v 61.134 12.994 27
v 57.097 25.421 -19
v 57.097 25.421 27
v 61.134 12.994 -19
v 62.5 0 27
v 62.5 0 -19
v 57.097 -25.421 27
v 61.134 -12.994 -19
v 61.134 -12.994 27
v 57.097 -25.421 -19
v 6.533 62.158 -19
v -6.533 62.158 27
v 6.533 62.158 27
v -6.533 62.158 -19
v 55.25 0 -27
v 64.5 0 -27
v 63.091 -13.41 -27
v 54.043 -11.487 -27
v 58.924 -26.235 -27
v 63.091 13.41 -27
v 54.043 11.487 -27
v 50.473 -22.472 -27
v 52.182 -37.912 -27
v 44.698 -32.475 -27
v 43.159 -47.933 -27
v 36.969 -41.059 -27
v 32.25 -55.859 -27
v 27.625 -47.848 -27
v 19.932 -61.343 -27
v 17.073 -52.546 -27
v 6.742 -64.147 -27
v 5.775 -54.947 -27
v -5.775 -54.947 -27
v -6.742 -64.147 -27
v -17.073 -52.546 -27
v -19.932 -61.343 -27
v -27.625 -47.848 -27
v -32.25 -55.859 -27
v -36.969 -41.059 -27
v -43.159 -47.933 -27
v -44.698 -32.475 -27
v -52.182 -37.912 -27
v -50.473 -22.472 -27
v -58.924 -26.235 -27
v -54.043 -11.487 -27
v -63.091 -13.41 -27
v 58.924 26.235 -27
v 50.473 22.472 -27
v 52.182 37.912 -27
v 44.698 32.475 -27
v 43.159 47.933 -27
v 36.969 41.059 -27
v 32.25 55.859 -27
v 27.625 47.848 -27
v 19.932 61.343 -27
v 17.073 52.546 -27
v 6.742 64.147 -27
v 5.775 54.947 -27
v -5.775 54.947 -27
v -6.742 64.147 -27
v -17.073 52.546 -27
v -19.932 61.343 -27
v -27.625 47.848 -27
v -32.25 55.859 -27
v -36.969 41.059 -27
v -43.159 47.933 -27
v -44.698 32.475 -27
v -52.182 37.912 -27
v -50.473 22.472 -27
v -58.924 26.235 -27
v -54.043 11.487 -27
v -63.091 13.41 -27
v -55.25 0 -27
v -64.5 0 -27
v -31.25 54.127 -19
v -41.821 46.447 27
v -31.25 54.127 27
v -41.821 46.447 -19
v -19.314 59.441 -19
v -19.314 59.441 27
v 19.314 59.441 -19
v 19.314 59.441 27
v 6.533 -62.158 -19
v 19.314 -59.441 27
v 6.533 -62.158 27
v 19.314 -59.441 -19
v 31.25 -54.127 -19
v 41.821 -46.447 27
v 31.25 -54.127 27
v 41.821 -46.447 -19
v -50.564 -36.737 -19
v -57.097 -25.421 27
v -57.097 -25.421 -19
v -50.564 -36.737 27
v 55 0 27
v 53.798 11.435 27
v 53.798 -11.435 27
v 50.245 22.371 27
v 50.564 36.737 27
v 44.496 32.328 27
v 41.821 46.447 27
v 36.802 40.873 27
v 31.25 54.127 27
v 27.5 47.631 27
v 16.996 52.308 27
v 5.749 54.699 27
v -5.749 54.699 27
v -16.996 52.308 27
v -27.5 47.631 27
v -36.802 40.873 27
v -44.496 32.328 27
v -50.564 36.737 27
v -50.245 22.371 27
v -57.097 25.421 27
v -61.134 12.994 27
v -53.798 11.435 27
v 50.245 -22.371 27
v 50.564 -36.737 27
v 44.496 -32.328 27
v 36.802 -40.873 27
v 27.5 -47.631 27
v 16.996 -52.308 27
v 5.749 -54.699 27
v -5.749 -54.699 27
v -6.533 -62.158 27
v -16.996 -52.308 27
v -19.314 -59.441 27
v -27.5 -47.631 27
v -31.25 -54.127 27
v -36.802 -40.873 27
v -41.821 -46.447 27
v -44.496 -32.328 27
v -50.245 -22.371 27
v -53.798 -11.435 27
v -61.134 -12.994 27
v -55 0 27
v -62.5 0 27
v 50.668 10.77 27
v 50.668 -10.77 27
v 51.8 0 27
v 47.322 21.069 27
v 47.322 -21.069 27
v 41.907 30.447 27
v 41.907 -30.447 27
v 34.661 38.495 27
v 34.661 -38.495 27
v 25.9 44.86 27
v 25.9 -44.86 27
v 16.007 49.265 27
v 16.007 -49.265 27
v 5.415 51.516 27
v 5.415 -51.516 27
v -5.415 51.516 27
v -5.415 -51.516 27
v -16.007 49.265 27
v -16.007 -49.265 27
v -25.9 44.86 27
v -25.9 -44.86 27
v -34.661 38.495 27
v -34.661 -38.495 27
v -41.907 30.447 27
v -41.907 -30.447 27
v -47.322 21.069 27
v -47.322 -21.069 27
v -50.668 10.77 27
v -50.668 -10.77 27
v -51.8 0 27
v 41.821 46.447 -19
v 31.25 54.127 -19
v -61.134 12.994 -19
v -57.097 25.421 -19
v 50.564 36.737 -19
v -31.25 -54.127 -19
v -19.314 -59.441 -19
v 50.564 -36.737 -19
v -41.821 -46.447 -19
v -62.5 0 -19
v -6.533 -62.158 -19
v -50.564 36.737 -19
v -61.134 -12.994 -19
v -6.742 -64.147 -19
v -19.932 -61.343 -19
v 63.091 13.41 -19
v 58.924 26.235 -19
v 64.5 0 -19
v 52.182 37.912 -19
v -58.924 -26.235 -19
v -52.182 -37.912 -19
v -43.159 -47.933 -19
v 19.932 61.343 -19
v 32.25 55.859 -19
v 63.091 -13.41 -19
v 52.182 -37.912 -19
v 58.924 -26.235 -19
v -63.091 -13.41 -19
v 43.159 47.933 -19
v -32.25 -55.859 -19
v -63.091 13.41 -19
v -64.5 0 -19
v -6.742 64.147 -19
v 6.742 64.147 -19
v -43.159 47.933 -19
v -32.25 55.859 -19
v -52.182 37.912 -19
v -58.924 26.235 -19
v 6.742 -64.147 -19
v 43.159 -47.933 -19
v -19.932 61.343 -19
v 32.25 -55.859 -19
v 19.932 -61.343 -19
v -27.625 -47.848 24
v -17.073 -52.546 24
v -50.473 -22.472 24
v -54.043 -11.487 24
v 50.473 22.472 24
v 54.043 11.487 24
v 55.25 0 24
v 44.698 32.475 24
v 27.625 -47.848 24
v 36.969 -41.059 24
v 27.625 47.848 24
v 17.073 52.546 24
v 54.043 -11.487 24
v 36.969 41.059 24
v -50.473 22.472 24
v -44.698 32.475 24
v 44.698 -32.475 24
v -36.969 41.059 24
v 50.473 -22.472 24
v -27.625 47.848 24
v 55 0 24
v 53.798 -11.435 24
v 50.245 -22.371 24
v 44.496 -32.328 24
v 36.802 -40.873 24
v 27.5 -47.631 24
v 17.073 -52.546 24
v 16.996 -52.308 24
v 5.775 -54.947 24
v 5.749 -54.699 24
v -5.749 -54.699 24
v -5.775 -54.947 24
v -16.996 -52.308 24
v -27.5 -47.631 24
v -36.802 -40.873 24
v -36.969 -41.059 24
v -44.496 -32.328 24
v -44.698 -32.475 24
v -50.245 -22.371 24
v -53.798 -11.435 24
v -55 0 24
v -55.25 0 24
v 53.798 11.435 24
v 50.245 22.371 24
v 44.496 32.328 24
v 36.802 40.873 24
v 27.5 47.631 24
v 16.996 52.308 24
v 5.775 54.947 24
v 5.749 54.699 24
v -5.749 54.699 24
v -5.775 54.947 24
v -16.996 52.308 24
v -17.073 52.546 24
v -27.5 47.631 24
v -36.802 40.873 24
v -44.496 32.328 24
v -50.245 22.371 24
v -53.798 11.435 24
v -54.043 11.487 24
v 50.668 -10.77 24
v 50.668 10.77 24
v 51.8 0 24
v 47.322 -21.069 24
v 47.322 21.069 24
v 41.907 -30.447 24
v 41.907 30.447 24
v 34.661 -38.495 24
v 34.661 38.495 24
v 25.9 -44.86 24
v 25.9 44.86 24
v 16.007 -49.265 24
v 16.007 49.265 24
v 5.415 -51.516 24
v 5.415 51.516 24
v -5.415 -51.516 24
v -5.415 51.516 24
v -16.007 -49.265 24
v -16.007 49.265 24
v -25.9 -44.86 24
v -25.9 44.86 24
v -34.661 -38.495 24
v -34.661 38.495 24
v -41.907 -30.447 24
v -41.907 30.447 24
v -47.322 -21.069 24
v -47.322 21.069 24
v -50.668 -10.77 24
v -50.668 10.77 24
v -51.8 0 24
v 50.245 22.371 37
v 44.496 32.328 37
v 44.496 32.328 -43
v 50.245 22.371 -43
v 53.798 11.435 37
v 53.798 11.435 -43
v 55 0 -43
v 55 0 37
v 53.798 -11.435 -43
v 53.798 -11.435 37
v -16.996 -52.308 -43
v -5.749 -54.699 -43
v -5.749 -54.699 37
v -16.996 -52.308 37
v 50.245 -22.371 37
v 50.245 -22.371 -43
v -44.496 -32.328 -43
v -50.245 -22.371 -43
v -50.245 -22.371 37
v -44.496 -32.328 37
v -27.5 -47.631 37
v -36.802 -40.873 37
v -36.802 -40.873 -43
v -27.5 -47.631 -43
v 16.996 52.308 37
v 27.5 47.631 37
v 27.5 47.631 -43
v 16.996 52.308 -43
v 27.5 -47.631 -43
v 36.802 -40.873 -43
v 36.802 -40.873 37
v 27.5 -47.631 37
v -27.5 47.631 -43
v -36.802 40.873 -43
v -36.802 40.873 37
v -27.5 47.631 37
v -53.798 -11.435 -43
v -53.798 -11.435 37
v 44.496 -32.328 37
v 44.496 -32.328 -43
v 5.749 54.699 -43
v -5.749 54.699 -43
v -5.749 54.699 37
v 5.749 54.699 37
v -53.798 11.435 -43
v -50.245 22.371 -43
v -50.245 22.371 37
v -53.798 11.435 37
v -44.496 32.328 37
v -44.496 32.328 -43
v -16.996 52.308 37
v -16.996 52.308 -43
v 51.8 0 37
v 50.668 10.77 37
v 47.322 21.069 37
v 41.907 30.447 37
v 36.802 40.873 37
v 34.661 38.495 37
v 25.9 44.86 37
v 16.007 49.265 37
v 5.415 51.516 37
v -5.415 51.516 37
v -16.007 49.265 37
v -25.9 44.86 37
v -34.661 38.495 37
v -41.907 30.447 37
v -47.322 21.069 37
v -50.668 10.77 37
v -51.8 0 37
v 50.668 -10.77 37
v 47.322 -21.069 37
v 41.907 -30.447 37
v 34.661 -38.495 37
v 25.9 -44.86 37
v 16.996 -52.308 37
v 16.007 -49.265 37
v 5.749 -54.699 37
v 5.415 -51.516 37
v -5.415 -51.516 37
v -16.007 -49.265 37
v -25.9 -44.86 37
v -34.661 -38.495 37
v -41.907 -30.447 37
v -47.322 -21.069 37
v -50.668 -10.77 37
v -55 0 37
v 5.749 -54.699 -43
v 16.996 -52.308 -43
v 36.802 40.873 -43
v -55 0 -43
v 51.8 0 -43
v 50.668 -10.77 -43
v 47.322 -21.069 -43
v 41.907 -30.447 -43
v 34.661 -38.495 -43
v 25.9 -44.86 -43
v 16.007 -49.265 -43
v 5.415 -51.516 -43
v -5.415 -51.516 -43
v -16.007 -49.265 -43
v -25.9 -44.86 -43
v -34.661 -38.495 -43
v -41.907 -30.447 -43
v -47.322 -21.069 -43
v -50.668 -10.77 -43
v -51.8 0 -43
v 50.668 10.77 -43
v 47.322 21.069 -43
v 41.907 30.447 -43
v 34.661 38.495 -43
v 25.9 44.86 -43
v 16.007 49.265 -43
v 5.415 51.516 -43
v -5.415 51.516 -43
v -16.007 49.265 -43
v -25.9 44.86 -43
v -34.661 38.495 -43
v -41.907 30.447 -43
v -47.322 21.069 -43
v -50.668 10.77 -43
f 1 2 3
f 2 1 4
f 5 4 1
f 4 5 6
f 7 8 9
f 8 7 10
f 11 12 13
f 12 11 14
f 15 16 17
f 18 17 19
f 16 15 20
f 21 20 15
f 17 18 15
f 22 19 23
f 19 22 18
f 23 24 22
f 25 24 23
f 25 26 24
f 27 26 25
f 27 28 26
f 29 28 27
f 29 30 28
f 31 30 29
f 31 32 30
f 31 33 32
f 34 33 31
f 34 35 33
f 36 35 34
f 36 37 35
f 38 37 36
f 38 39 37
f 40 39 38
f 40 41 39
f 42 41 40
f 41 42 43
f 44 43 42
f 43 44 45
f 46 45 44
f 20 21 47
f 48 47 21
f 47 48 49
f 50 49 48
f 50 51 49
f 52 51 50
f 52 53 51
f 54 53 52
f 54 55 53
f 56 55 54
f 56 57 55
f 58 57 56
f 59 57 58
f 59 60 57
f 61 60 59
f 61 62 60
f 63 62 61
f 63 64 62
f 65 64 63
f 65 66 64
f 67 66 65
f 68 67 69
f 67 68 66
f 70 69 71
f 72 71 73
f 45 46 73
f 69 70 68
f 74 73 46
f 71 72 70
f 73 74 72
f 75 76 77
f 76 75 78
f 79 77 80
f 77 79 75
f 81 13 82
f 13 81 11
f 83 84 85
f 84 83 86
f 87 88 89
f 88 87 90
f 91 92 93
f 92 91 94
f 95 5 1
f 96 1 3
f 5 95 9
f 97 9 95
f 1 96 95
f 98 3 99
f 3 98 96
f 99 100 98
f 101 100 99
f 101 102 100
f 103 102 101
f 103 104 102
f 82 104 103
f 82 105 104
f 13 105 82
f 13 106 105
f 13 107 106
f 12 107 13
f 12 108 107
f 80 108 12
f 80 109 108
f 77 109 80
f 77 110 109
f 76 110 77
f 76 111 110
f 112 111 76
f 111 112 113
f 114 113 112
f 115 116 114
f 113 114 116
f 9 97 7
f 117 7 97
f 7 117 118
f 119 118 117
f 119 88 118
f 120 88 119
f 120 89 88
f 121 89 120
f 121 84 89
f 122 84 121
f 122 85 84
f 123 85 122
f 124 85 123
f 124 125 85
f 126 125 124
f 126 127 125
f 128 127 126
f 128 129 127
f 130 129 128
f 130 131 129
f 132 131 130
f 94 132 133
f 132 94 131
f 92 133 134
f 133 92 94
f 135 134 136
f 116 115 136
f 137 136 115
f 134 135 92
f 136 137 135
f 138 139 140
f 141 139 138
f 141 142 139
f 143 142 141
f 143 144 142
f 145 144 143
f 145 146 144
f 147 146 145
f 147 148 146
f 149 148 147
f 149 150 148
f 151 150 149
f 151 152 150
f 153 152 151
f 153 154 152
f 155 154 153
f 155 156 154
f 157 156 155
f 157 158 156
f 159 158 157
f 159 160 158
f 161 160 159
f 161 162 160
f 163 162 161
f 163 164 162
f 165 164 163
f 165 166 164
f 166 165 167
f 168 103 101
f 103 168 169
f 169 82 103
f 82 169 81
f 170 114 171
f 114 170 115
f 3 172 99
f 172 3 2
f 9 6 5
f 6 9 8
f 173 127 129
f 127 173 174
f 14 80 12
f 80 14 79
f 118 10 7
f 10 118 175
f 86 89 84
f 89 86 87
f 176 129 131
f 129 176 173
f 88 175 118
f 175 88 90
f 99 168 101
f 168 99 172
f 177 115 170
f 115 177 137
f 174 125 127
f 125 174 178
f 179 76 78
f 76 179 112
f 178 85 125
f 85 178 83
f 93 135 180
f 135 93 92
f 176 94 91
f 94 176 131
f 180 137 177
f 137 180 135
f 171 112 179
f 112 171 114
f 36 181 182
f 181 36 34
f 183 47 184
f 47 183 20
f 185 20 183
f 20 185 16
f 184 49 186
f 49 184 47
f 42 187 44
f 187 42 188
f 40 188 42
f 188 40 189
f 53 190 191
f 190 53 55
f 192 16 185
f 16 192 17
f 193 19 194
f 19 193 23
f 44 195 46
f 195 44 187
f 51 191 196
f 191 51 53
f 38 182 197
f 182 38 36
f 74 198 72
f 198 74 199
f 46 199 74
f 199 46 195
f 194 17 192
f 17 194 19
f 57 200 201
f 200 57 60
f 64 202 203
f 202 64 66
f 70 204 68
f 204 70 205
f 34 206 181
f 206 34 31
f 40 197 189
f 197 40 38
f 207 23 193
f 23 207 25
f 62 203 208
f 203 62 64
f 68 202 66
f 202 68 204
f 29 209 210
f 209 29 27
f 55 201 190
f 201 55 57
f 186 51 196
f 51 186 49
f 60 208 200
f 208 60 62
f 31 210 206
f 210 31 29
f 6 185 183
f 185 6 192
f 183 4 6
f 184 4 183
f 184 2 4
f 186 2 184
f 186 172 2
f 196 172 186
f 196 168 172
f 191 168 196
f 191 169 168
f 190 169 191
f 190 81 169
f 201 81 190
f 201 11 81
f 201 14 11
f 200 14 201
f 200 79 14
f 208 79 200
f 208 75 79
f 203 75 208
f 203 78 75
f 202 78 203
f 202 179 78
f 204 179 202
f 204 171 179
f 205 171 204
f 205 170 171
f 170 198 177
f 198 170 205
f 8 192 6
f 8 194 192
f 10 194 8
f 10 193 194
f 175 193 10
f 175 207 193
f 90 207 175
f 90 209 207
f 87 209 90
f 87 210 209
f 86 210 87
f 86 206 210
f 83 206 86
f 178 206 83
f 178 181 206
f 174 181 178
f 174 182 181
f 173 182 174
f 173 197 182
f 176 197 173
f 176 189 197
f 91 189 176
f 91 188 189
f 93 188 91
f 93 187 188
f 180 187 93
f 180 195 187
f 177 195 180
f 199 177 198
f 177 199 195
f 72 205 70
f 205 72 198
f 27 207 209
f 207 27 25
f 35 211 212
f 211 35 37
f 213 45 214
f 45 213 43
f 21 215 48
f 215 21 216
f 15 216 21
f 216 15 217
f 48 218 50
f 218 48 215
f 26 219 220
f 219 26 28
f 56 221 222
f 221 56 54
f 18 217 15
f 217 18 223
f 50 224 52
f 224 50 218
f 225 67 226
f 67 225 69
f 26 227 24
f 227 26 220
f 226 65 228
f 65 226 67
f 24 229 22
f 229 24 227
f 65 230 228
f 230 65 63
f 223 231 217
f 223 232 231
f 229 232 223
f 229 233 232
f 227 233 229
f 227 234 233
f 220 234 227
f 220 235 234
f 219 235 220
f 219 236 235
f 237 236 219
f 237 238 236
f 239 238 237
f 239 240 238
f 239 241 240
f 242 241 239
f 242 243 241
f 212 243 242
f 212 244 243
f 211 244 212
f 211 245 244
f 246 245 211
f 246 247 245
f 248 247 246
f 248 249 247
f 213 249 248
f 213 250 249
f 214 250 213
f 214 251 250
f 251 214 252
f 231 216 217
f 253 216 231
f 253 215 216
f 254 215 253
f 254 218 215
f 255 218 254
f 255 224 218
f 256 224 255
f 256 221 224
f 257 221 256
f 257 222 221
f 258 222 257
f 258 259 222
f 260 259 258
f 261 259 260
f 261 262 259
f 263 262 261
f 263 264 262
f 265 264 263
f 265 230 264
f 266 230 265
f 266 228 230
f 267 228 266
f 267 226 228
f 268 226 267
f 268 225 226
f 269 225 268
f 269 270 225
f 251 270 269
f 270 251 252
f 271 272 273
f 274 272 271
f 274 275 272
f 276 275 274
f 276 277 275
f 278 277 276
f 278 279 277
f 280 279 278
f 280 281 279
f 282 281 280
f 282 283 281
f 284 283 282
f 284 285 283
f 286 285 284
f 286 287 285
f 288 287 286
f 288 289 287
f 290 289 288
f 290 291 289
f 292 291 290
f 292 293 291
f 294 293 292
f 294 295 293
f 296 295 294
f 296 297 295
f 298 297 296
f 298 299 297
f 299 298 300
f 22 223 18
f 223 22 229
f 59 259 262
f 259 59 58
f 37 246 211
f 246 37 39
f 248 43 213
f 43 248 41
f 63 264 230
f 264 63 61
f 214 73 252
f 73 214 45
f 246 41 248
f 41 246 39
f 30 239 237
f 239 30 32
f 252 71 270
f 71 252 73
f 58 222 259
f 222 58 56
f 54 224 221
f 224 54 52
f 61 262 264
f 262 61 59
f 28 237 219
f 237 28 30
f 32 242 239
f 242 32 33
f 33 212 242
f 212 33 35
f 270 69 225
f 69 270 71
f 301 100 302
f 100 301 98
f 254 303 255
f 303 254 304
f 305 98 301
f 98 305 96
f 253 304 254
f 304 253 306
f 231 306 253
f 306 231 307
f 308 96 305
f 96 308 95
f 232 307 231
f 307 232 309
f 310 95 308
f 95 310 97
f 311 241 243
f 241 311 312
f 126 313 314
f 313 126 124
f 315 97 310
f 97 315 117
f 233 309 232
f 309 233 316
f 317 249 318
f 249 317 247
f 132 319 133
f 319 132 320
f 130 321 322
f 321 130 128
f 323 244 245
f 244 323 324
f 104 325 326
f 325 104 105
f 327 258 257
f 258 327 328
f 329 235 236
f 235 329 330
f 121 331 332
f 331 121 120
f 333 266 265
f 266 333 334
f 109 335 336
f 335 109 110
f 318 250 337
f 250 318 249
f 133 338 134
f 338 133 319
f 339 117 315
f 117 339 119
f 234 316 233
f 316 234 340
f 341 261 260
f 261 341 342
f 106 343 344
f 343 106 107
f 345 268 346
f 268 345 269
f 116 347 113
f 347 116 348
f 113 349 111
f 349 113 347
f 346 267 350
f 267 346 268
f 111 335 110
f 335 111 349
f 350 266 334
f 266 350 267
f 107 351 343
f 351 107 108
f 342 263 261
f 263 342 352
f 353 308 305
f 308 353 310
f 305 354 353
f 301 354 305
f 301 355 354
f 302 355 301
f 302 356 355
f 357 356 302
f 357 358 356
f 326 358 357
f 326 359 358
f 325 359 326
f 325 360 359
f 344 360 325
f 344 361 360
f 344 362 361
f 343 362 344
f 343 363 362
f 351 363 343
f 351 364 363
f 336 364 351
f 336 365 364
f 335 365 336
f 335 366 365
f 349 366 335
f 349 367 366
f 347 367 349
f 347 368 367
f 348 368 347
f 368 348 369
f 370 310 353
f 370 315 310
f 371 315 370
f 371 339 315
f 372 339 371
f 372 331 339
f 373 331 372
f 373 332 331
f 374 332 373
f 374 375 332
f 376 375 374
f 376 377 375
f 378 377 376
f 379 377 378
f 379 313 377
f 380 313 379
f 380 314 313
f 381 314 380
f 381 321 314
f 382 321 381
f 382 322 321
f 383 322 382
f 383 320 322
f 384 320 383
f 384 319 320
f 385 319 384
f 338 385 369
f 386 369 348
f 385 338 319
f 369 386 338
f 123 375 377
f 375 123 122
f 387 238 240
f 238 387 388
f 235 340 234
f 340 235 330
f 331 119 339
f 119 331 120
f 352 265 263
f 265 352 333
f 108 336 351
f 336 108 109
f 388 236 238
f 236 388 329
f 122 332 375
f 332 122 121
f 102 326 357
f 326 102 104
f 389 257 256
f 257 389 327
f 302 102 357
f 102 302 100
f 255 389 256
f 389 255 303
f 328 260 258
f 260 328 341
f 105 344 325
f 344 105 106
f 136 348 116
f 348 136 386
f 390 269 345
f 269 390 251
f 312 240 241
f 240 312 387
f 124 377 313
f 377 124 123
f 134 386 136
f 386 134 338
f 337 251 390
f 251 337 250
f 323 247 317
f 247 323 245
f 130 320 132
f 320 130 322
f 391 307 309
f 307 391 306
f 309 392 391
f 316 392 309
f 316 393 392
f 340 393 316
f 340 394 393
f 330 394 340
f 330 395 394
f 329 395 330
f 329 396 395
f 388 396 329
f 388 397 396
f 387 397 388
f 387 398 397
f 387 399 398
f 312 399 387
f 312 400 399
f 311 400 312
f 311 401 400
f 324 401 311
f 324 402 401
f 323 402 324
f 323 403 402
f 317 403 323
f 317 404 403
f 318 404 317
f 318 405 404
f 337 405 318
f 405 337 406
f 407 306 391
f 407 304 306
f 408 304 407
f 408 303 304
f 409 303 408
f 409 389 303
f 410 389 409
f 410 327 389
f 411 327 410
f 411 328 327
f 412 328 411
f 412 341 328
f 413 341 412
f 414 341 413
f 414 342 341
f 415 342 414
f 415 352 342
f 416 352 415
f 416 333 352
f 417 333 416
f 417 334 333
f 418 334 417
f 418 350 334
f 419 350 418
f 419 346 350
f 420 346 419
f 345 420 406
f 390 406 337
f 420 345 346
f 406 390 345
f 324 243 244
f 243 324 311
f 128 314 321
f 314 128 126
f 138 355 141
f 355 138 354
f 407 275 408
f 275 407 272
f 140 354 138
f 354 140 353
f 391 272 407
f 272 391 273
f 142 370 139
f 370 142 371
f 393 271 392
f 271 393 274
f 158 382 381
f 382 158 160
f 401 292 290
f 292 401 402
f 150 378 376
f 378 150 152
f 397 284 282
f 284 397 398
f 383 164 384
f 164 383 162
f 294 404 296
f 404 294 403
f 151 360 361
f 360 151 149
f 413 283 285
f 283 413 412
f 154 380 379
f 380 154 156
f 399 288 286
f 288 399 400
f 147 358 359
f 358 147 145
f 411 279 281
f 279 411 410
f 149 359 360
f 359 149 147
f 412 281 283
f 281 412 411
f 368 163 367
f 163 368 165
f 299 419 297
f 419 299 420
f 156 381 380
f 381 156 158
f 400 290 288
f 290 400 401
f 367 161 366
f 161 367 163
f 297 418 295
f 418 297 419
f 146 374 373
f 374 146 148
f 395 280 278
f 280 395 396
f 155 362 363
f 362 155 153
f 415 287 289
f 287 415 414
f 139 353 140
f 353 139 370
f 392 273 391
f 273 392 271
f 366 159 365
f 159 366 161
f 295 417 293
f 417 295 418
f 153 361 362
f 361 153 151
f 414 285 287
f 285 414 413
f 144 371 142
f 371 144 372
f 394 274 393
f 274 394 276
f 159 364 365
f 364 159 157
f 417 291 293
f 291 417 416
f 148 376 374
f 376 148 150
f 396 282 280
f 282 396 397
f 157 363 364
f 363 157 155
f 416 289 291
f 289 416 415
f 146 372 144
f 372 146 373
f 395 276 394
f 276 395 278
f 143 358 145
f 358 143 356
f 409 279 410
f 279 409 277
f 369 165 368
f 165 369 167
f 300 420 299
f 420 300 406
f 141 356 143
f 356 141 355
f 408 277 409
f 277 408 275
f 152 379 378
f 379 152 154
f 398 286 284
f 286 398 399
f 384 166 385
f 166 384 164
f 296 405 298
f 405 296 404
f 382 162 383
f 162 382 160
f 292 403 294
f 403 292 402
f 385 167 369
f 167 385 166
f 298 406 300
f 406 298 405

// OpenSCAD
// Parameters
nominal_diameter_mm = 110; //[55:220:1]
pipe_outer_diameter_mm = 110; //[90:140:0.1]
cap_outer_diameter_mm = 125; //[110:160:0.1]
wall_thickness_mm = 3.2; //[1.6:6.4:0.1]
socket_inner_diameter_mm = 110.5; //[109:113:0.1]
socket_depth_mm = 50; //[30:90:1]
end_face_thickness_mm = 4; //[2:10:0.5]
stop_shoulder_height_mm = 2; //[1:6:0.5]
outer_rim_height_mm = 8; //[4:20:1]
outer_rim_thickness_mm = 2; //[1:6:0.5]
fillet_radius_mm = 1; //[0:3:0.25]
overlap_mm = 1; //[0.5:2:0.1]
pipe_wall_thickness_mm = 3.2; //[1.6:6.4:0.1]
pipe_stub_length_mm = 80; //[40:160:1]

// HT Pipe - complete geometry
module ht_pipe() {
  color([0.85, 0.85, 0.8]) {
    difference() {
      // Outer pipe
      cylinder(r=pipe_outer_diameter_mm/2, h=pipe_stub_length_mm, center=true);
      // Inner pipe
      translate([0, 0, -overlap_mm/2])
        cylinder(r=pipe_outer_diameter_mm/2 - pipe_wall_thickness_mm, h=pipe_stub_length_mm + overlap_mm, center=true);
    }
  }
}

// Cap assembly
module cap() {
  color([0.85, 0.85, 0.8]) {
    difference() {
      union() {
        // Cap body
        translate([0, 0, 0])
          cylinder(r=cap_outer_diameter_mm/2, h=socket_depth_mm + end_face_thickness_mm, center=true);
        // Closed end face
        translate([0, 0, (socket_depth_mm + end_face_thickness_mm)/2 - end_face_thickness_mm/2])
          cylinder(r=cap_outer_diameter_mm/2, h=end_face_thickness_mm, center=true);
        // Outer grip rim
        translate([0, 0, -(socket_depth_mm + end_face_thickness_mm)/2 + outer_rim_height_mm/2])
          cylinder(r=cap_outer_diameter_mm/2 + outer_rim_thickness_mm, h=outer_rim_height_mm, center=true);
        // Insertion stop shoulder
        translate([0, 0, -(socket_depth_mm + end_face_thickness_mm)/2 + socket_depth_mm - stop_shoulder_height_mm/2])
          cylinder(r=(socket_inner_diameter_mm/2) - wall_thickness_mm, h=stop_shoulder_height_mm, center=true);
      }
      // Inner socket cavity
      translate([0, 0, -(socket_depth_mm + end_face_thickness_mm)/2 + (socket_depth_mm + overlap_mm)/2])
        cylinder(r=socket_inner_diameter_mm/2, h=socket_depth_mm + overlap_mm, center=true);
    }
  }
}

// Assembly
module assembly() {
  cap();
  translate([0, 0, -(socket_depth_mm + end_face_thickness_mm)/2 + socket_depth_mm/2 - overlap_mm])
    ht_pipe();
}

assembly();
